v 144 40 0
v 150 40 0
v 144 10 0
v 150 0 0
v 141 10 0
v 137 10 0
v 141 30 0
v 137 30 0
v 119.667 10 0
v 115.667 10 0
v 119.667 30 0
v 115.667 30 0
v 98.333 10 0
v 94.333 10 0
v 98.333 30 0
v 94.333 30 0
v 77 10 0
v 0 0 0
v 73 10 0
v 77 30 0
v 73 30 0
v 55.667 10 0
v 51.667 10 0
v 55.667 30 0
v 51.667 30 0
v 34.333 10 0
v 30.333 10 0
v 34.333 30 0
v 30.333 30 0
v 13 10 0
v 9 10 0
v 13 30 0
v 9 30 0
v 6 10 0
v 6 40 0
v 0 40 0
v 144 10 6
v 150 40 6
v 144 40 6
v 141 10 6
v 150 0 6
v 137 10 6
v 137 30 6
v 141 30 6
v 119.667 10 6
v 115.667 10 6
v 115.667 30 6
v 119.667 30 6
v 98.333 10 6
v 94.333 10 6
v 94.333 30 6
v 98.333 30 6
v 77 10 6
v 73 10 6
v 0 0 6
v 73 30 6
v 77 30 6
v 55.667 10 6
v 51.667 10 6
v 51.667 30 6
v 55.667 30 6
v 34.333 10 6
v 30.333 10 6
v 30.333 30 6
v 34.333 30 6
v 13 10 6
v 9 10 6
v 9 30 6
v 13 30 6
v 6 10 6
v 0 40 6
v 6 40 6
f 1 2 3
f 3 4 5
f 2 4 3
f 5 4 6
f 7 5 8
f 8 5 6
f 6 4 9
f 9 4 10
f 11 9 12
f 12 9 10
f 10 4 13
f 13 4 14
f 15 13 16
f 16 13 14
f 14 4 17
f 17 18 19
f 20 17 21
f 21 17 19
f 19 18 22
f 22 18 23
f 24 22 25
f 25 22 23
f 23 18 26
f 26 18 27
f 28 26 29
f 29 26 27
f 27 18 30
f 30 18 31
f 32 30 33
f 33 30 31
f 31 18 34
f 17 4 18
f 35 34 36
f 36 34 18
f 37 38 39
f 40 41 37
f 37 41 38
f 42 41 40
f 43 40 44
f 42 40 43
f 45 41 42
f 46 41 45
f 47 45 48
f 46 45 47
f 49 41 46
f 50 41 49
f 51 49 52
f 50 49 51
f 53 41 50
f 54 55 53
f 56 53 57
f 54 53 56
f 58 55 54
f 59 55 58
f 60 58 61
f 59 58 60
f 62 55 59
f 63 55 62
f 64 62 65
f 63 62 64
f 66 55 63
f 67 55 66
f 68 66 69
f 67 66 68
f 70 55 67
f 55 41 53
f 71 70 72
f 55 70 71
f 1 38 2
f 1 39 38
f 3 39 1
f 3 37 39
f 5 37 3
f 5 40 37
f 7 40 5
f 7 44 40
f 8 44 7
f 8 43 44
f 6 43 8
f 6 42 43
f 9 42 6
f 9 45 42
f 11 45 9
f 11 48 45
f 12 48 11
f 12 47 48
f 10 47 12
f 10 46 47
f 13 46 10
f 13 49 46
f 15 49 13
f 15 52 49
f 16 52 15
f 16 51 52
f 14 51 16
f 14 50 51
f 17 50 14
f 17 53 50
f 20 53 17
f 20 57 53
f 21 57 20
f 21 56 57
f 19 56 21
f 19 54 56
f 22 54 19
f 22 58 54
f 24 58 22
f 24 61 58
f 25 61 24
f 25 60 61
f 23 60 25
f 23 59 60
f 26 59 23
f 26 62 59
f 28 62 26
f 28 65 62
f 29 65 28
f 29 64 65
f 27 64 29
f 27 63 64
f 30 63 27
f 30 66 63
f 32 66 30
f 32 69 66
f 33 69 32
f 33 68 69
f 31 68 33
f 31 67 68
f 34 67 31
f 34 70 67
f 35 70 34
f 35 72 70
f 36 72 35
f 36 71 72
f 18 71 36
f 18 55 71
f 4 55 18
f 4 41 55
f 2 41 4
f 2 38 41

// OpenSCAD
$fn = 32;

// ----------------------------------------------------------------------
// Guard grille: 7 slats over a 150 x 40 mm plate
// ----------------------------------------------------------------------

// --- parameters (mm) ---
profile_height = 6;       // extrusion height
profile_points = 36;      // points of the closed outline

profile = [[0, 0], [150, 0], [150, 40], [144, 40], [144, 10], [141, 10], [141, 30], [137, 30], [137, 10], [119.667, 10], [119.667, 30], [115.667, 30], [115.667, 10], [98.333, 10], [98.333, 30], [94.333, 30], [94.333, 10], [77, 10], [77, 30], [73, 30], [73, 10], [55.667, 10], [55.667, 30], [51.667, 30], [51.667, 10], [34.333, 10], [34.333, 30], [30.333, 30], [30.333, 10], [13, 10], [13, 30], [9, 30], [9, 10], [6, 10], [6, 40], [0, 40]];  // single closed polygon, 36 points, counter clockwise

// --- the one profile operation ---
linear_extrude(height = profile_height) polygon(points = profile);
